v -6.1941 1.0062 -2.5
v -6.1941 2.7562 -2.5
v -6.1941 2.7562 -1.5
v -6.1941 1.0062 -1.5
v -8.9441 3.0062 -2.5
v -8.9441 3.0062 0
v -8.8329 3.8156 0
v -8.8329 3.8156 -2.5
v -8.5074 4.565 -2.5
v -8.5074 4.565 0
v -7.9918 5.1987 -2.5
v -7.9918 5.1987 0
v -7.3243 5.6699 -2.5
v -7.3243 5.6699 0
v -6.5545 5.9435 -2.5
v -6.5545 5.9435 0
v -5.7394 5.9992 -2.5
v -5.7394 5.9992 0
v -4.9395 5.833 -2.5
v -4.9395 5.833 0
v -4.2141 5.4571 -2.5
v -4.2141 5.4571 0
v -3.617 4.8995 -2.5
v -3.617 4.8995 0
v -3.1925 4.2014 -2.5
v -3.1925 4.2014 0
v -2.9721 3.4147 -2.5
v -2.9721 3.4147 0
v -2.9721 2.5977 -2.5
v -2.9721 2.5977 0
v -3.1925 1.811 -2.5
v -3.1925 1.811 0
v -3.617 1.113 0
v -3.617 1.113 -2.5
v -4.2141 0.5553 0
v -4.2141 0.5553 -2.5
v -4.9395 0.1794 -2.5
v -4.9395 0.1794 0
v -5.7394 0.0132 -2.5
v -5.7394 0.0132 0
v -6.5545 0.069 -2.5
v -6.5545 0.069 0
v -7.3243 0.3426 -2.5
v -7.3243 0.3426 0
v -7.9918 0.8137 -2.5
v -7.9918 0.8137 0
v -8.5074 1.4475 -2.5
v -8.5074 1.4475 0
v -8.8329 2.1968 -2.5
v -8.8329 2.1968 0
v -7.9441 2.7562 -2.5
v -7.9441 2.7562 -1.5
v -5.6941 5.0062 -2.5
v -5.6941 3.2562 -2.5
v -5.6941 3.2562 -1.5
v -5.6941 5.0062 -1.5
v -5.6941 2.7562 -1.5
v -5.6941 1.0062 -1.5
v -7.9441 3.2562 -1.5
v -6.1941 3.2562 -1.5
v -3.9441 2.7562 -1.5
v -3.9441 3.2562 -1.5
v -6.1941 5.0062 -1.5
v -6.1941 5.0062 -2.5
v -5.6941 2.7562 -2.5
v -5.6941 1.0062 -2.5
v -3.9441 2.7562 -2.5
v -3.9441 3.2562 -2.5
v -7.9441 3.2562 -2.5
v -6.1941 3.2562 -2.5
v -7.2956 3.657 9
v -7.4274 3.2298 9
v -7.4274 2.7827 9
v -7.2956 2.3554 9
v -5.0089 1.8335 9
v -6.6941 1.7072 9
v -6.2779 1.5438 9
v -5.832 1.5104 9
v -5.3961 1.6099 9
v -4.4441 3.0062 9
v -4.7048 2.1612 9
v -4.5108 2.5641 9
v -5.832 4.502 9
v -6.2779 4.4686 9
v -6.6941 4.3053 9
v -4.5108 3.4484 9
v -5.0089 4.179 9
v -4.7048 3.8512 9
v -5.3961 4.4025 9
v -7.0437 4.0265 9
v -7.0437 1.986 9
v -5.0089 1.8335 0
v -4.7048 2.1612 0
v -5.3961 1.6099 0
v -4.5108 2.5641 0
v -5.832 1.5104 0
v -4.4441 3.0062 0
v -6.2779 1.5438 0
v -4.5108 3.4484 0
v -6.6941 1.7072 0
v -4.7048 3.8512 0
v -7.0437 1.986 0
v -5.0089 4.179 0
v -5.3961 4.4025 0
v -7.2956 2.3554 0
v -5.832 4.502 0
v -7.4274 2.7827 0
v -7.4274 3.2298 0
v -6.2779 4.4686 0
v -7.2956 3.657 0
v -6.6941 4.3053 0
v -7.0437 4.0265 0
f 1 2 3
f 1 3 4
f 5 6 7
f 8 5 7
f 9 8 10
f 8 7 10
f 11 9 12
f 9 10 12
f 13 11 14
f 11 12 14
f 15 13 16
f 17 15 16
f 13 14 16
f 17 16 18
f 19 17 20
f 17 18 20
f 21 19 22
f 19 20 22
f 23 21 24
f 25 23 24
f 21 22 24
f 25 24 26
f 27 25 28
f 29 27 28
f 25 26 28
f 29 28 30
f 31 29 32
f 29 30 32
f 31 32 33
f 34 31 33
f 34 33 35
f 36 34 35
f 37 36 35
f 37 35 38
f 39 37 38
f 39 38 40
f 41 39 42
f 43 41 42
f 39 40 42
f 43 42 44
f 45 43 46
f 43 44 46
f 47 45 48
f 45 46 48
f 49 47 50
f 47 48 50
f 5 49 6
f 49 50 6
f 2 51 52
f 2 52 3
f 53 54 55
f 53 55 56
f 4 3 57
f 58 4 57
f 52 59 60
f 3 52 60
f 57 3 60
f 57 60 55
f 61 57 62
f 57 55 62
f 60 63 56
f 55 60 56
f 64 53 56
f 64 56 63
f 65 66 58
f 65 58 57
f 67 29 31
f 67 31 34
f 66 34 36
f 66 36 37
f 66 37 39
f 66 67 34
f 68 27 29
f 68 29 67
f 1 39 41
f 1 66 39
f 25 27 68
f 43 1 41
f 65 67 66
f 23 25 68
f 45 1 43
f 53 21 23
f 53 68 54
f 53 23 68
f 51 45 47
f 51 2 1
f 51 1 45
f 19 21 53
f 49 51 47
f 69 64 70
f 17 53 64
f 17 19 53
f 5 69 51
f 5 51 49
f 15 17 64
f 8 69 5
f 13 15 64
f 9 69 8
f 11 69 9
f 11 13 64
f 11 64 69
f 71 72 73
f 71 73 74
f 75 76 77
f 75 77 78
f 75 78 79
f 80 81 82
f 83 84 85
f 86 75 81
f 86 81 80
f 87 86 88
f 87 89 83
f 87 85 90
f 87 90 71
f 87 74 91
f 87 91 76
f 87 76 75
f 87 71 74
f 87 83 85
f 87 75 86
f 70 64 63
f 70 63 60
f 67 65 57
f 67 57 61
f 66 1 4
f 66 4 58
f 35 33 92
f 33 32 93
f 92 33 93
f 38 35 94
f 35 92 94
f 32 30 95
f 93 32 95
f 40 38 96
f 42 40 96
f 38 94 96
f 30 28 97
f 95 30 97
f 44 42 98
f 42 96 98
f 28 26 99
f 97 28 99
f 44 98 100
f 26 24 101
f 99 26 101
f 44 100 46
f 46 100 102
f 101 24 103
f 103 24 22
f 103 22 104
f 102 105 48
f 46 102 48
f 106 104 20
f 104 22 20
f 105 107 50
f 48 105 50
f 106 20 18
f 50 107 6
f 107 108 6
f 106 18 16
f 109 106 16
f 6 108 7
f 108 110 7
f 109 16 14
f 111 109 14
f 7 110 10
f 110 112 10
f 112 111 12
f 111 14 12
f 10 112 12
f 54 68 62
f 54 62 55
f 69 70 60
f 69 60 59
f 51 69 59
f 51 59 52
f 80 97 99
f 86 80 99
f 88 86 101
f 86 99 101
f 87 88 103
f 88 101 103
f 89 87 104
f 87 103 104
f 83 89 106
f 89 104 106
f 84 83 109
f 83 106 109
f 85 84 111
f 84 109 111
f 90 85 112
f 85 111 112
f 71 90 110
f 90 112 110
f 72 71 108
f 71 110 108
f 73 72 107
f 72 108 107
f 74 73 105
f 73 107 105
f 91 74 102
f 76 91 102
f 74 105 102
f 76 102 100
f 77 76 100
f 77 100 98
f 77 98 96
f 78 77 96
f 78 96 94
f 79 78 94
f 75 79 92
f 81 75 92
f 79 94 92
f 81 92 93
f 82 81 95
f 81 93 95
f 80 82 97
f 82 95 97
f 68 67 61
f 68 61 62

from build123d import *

# Parameters (mm, degrees)
SKETCH_1_R          = 1.5
EXTRUDE_1_DEPTH     = 9
SKETCH_2_R          = 3
EXTRUDE_2_DEPTH     = 2.5
CUT_EXTRUDE_3_DEPTH = 1


with BuildPart() as part:
    # 草图1 → 凸台-拉伸1 (new body)
    with BuildSketch(Plane.XY):
        with Locations((-5.944112119, 3.006217623)):
            Circle(SKETCH_1_R)
    extrude(amount=EXTRUDE_1_DEPTH)

    # 草图2 → 凸台-拉伸2 (add)
    with BuildSketch(Plane(origin=(0, 0, 0), x_dir=(-1, 0, 0), z_dir=(0, 0, -1))):
        with Locations((5.944112119, 3.006217623)):
            Circle(SKETCH_2_R)
    extrude(amount=EXTRUDE_2_DEPTH)

    # 草图4 → 切除-拉伸3 (cut)
    with BuildSketch(Plane(origin=(0, 0, -2.5), x_dir=(-1, 0, 0), z_dir=(0, 0, -1))):
        Polygon((3.944112119, 3.256217623), (5.694112119, 3.256217623), (5.694112119, 5.006217623), (6.194112119, 5.006217623), (6.194112119, 3.256217623), (7.944112119, 3.256217623), (7.944112119, 2.756217623), (6.194112119, 2.756217623), (6.194112119, 1.006217623), (5.694112119, 1.006217623), (5.694112119, 2.756217623), (3.944112119, 2.756217623), align=None)
    extrude(amount=-CUT_EXTRUDE_3_DEPTH, mode=Mode.SUBTRACT)


solid = part.part
